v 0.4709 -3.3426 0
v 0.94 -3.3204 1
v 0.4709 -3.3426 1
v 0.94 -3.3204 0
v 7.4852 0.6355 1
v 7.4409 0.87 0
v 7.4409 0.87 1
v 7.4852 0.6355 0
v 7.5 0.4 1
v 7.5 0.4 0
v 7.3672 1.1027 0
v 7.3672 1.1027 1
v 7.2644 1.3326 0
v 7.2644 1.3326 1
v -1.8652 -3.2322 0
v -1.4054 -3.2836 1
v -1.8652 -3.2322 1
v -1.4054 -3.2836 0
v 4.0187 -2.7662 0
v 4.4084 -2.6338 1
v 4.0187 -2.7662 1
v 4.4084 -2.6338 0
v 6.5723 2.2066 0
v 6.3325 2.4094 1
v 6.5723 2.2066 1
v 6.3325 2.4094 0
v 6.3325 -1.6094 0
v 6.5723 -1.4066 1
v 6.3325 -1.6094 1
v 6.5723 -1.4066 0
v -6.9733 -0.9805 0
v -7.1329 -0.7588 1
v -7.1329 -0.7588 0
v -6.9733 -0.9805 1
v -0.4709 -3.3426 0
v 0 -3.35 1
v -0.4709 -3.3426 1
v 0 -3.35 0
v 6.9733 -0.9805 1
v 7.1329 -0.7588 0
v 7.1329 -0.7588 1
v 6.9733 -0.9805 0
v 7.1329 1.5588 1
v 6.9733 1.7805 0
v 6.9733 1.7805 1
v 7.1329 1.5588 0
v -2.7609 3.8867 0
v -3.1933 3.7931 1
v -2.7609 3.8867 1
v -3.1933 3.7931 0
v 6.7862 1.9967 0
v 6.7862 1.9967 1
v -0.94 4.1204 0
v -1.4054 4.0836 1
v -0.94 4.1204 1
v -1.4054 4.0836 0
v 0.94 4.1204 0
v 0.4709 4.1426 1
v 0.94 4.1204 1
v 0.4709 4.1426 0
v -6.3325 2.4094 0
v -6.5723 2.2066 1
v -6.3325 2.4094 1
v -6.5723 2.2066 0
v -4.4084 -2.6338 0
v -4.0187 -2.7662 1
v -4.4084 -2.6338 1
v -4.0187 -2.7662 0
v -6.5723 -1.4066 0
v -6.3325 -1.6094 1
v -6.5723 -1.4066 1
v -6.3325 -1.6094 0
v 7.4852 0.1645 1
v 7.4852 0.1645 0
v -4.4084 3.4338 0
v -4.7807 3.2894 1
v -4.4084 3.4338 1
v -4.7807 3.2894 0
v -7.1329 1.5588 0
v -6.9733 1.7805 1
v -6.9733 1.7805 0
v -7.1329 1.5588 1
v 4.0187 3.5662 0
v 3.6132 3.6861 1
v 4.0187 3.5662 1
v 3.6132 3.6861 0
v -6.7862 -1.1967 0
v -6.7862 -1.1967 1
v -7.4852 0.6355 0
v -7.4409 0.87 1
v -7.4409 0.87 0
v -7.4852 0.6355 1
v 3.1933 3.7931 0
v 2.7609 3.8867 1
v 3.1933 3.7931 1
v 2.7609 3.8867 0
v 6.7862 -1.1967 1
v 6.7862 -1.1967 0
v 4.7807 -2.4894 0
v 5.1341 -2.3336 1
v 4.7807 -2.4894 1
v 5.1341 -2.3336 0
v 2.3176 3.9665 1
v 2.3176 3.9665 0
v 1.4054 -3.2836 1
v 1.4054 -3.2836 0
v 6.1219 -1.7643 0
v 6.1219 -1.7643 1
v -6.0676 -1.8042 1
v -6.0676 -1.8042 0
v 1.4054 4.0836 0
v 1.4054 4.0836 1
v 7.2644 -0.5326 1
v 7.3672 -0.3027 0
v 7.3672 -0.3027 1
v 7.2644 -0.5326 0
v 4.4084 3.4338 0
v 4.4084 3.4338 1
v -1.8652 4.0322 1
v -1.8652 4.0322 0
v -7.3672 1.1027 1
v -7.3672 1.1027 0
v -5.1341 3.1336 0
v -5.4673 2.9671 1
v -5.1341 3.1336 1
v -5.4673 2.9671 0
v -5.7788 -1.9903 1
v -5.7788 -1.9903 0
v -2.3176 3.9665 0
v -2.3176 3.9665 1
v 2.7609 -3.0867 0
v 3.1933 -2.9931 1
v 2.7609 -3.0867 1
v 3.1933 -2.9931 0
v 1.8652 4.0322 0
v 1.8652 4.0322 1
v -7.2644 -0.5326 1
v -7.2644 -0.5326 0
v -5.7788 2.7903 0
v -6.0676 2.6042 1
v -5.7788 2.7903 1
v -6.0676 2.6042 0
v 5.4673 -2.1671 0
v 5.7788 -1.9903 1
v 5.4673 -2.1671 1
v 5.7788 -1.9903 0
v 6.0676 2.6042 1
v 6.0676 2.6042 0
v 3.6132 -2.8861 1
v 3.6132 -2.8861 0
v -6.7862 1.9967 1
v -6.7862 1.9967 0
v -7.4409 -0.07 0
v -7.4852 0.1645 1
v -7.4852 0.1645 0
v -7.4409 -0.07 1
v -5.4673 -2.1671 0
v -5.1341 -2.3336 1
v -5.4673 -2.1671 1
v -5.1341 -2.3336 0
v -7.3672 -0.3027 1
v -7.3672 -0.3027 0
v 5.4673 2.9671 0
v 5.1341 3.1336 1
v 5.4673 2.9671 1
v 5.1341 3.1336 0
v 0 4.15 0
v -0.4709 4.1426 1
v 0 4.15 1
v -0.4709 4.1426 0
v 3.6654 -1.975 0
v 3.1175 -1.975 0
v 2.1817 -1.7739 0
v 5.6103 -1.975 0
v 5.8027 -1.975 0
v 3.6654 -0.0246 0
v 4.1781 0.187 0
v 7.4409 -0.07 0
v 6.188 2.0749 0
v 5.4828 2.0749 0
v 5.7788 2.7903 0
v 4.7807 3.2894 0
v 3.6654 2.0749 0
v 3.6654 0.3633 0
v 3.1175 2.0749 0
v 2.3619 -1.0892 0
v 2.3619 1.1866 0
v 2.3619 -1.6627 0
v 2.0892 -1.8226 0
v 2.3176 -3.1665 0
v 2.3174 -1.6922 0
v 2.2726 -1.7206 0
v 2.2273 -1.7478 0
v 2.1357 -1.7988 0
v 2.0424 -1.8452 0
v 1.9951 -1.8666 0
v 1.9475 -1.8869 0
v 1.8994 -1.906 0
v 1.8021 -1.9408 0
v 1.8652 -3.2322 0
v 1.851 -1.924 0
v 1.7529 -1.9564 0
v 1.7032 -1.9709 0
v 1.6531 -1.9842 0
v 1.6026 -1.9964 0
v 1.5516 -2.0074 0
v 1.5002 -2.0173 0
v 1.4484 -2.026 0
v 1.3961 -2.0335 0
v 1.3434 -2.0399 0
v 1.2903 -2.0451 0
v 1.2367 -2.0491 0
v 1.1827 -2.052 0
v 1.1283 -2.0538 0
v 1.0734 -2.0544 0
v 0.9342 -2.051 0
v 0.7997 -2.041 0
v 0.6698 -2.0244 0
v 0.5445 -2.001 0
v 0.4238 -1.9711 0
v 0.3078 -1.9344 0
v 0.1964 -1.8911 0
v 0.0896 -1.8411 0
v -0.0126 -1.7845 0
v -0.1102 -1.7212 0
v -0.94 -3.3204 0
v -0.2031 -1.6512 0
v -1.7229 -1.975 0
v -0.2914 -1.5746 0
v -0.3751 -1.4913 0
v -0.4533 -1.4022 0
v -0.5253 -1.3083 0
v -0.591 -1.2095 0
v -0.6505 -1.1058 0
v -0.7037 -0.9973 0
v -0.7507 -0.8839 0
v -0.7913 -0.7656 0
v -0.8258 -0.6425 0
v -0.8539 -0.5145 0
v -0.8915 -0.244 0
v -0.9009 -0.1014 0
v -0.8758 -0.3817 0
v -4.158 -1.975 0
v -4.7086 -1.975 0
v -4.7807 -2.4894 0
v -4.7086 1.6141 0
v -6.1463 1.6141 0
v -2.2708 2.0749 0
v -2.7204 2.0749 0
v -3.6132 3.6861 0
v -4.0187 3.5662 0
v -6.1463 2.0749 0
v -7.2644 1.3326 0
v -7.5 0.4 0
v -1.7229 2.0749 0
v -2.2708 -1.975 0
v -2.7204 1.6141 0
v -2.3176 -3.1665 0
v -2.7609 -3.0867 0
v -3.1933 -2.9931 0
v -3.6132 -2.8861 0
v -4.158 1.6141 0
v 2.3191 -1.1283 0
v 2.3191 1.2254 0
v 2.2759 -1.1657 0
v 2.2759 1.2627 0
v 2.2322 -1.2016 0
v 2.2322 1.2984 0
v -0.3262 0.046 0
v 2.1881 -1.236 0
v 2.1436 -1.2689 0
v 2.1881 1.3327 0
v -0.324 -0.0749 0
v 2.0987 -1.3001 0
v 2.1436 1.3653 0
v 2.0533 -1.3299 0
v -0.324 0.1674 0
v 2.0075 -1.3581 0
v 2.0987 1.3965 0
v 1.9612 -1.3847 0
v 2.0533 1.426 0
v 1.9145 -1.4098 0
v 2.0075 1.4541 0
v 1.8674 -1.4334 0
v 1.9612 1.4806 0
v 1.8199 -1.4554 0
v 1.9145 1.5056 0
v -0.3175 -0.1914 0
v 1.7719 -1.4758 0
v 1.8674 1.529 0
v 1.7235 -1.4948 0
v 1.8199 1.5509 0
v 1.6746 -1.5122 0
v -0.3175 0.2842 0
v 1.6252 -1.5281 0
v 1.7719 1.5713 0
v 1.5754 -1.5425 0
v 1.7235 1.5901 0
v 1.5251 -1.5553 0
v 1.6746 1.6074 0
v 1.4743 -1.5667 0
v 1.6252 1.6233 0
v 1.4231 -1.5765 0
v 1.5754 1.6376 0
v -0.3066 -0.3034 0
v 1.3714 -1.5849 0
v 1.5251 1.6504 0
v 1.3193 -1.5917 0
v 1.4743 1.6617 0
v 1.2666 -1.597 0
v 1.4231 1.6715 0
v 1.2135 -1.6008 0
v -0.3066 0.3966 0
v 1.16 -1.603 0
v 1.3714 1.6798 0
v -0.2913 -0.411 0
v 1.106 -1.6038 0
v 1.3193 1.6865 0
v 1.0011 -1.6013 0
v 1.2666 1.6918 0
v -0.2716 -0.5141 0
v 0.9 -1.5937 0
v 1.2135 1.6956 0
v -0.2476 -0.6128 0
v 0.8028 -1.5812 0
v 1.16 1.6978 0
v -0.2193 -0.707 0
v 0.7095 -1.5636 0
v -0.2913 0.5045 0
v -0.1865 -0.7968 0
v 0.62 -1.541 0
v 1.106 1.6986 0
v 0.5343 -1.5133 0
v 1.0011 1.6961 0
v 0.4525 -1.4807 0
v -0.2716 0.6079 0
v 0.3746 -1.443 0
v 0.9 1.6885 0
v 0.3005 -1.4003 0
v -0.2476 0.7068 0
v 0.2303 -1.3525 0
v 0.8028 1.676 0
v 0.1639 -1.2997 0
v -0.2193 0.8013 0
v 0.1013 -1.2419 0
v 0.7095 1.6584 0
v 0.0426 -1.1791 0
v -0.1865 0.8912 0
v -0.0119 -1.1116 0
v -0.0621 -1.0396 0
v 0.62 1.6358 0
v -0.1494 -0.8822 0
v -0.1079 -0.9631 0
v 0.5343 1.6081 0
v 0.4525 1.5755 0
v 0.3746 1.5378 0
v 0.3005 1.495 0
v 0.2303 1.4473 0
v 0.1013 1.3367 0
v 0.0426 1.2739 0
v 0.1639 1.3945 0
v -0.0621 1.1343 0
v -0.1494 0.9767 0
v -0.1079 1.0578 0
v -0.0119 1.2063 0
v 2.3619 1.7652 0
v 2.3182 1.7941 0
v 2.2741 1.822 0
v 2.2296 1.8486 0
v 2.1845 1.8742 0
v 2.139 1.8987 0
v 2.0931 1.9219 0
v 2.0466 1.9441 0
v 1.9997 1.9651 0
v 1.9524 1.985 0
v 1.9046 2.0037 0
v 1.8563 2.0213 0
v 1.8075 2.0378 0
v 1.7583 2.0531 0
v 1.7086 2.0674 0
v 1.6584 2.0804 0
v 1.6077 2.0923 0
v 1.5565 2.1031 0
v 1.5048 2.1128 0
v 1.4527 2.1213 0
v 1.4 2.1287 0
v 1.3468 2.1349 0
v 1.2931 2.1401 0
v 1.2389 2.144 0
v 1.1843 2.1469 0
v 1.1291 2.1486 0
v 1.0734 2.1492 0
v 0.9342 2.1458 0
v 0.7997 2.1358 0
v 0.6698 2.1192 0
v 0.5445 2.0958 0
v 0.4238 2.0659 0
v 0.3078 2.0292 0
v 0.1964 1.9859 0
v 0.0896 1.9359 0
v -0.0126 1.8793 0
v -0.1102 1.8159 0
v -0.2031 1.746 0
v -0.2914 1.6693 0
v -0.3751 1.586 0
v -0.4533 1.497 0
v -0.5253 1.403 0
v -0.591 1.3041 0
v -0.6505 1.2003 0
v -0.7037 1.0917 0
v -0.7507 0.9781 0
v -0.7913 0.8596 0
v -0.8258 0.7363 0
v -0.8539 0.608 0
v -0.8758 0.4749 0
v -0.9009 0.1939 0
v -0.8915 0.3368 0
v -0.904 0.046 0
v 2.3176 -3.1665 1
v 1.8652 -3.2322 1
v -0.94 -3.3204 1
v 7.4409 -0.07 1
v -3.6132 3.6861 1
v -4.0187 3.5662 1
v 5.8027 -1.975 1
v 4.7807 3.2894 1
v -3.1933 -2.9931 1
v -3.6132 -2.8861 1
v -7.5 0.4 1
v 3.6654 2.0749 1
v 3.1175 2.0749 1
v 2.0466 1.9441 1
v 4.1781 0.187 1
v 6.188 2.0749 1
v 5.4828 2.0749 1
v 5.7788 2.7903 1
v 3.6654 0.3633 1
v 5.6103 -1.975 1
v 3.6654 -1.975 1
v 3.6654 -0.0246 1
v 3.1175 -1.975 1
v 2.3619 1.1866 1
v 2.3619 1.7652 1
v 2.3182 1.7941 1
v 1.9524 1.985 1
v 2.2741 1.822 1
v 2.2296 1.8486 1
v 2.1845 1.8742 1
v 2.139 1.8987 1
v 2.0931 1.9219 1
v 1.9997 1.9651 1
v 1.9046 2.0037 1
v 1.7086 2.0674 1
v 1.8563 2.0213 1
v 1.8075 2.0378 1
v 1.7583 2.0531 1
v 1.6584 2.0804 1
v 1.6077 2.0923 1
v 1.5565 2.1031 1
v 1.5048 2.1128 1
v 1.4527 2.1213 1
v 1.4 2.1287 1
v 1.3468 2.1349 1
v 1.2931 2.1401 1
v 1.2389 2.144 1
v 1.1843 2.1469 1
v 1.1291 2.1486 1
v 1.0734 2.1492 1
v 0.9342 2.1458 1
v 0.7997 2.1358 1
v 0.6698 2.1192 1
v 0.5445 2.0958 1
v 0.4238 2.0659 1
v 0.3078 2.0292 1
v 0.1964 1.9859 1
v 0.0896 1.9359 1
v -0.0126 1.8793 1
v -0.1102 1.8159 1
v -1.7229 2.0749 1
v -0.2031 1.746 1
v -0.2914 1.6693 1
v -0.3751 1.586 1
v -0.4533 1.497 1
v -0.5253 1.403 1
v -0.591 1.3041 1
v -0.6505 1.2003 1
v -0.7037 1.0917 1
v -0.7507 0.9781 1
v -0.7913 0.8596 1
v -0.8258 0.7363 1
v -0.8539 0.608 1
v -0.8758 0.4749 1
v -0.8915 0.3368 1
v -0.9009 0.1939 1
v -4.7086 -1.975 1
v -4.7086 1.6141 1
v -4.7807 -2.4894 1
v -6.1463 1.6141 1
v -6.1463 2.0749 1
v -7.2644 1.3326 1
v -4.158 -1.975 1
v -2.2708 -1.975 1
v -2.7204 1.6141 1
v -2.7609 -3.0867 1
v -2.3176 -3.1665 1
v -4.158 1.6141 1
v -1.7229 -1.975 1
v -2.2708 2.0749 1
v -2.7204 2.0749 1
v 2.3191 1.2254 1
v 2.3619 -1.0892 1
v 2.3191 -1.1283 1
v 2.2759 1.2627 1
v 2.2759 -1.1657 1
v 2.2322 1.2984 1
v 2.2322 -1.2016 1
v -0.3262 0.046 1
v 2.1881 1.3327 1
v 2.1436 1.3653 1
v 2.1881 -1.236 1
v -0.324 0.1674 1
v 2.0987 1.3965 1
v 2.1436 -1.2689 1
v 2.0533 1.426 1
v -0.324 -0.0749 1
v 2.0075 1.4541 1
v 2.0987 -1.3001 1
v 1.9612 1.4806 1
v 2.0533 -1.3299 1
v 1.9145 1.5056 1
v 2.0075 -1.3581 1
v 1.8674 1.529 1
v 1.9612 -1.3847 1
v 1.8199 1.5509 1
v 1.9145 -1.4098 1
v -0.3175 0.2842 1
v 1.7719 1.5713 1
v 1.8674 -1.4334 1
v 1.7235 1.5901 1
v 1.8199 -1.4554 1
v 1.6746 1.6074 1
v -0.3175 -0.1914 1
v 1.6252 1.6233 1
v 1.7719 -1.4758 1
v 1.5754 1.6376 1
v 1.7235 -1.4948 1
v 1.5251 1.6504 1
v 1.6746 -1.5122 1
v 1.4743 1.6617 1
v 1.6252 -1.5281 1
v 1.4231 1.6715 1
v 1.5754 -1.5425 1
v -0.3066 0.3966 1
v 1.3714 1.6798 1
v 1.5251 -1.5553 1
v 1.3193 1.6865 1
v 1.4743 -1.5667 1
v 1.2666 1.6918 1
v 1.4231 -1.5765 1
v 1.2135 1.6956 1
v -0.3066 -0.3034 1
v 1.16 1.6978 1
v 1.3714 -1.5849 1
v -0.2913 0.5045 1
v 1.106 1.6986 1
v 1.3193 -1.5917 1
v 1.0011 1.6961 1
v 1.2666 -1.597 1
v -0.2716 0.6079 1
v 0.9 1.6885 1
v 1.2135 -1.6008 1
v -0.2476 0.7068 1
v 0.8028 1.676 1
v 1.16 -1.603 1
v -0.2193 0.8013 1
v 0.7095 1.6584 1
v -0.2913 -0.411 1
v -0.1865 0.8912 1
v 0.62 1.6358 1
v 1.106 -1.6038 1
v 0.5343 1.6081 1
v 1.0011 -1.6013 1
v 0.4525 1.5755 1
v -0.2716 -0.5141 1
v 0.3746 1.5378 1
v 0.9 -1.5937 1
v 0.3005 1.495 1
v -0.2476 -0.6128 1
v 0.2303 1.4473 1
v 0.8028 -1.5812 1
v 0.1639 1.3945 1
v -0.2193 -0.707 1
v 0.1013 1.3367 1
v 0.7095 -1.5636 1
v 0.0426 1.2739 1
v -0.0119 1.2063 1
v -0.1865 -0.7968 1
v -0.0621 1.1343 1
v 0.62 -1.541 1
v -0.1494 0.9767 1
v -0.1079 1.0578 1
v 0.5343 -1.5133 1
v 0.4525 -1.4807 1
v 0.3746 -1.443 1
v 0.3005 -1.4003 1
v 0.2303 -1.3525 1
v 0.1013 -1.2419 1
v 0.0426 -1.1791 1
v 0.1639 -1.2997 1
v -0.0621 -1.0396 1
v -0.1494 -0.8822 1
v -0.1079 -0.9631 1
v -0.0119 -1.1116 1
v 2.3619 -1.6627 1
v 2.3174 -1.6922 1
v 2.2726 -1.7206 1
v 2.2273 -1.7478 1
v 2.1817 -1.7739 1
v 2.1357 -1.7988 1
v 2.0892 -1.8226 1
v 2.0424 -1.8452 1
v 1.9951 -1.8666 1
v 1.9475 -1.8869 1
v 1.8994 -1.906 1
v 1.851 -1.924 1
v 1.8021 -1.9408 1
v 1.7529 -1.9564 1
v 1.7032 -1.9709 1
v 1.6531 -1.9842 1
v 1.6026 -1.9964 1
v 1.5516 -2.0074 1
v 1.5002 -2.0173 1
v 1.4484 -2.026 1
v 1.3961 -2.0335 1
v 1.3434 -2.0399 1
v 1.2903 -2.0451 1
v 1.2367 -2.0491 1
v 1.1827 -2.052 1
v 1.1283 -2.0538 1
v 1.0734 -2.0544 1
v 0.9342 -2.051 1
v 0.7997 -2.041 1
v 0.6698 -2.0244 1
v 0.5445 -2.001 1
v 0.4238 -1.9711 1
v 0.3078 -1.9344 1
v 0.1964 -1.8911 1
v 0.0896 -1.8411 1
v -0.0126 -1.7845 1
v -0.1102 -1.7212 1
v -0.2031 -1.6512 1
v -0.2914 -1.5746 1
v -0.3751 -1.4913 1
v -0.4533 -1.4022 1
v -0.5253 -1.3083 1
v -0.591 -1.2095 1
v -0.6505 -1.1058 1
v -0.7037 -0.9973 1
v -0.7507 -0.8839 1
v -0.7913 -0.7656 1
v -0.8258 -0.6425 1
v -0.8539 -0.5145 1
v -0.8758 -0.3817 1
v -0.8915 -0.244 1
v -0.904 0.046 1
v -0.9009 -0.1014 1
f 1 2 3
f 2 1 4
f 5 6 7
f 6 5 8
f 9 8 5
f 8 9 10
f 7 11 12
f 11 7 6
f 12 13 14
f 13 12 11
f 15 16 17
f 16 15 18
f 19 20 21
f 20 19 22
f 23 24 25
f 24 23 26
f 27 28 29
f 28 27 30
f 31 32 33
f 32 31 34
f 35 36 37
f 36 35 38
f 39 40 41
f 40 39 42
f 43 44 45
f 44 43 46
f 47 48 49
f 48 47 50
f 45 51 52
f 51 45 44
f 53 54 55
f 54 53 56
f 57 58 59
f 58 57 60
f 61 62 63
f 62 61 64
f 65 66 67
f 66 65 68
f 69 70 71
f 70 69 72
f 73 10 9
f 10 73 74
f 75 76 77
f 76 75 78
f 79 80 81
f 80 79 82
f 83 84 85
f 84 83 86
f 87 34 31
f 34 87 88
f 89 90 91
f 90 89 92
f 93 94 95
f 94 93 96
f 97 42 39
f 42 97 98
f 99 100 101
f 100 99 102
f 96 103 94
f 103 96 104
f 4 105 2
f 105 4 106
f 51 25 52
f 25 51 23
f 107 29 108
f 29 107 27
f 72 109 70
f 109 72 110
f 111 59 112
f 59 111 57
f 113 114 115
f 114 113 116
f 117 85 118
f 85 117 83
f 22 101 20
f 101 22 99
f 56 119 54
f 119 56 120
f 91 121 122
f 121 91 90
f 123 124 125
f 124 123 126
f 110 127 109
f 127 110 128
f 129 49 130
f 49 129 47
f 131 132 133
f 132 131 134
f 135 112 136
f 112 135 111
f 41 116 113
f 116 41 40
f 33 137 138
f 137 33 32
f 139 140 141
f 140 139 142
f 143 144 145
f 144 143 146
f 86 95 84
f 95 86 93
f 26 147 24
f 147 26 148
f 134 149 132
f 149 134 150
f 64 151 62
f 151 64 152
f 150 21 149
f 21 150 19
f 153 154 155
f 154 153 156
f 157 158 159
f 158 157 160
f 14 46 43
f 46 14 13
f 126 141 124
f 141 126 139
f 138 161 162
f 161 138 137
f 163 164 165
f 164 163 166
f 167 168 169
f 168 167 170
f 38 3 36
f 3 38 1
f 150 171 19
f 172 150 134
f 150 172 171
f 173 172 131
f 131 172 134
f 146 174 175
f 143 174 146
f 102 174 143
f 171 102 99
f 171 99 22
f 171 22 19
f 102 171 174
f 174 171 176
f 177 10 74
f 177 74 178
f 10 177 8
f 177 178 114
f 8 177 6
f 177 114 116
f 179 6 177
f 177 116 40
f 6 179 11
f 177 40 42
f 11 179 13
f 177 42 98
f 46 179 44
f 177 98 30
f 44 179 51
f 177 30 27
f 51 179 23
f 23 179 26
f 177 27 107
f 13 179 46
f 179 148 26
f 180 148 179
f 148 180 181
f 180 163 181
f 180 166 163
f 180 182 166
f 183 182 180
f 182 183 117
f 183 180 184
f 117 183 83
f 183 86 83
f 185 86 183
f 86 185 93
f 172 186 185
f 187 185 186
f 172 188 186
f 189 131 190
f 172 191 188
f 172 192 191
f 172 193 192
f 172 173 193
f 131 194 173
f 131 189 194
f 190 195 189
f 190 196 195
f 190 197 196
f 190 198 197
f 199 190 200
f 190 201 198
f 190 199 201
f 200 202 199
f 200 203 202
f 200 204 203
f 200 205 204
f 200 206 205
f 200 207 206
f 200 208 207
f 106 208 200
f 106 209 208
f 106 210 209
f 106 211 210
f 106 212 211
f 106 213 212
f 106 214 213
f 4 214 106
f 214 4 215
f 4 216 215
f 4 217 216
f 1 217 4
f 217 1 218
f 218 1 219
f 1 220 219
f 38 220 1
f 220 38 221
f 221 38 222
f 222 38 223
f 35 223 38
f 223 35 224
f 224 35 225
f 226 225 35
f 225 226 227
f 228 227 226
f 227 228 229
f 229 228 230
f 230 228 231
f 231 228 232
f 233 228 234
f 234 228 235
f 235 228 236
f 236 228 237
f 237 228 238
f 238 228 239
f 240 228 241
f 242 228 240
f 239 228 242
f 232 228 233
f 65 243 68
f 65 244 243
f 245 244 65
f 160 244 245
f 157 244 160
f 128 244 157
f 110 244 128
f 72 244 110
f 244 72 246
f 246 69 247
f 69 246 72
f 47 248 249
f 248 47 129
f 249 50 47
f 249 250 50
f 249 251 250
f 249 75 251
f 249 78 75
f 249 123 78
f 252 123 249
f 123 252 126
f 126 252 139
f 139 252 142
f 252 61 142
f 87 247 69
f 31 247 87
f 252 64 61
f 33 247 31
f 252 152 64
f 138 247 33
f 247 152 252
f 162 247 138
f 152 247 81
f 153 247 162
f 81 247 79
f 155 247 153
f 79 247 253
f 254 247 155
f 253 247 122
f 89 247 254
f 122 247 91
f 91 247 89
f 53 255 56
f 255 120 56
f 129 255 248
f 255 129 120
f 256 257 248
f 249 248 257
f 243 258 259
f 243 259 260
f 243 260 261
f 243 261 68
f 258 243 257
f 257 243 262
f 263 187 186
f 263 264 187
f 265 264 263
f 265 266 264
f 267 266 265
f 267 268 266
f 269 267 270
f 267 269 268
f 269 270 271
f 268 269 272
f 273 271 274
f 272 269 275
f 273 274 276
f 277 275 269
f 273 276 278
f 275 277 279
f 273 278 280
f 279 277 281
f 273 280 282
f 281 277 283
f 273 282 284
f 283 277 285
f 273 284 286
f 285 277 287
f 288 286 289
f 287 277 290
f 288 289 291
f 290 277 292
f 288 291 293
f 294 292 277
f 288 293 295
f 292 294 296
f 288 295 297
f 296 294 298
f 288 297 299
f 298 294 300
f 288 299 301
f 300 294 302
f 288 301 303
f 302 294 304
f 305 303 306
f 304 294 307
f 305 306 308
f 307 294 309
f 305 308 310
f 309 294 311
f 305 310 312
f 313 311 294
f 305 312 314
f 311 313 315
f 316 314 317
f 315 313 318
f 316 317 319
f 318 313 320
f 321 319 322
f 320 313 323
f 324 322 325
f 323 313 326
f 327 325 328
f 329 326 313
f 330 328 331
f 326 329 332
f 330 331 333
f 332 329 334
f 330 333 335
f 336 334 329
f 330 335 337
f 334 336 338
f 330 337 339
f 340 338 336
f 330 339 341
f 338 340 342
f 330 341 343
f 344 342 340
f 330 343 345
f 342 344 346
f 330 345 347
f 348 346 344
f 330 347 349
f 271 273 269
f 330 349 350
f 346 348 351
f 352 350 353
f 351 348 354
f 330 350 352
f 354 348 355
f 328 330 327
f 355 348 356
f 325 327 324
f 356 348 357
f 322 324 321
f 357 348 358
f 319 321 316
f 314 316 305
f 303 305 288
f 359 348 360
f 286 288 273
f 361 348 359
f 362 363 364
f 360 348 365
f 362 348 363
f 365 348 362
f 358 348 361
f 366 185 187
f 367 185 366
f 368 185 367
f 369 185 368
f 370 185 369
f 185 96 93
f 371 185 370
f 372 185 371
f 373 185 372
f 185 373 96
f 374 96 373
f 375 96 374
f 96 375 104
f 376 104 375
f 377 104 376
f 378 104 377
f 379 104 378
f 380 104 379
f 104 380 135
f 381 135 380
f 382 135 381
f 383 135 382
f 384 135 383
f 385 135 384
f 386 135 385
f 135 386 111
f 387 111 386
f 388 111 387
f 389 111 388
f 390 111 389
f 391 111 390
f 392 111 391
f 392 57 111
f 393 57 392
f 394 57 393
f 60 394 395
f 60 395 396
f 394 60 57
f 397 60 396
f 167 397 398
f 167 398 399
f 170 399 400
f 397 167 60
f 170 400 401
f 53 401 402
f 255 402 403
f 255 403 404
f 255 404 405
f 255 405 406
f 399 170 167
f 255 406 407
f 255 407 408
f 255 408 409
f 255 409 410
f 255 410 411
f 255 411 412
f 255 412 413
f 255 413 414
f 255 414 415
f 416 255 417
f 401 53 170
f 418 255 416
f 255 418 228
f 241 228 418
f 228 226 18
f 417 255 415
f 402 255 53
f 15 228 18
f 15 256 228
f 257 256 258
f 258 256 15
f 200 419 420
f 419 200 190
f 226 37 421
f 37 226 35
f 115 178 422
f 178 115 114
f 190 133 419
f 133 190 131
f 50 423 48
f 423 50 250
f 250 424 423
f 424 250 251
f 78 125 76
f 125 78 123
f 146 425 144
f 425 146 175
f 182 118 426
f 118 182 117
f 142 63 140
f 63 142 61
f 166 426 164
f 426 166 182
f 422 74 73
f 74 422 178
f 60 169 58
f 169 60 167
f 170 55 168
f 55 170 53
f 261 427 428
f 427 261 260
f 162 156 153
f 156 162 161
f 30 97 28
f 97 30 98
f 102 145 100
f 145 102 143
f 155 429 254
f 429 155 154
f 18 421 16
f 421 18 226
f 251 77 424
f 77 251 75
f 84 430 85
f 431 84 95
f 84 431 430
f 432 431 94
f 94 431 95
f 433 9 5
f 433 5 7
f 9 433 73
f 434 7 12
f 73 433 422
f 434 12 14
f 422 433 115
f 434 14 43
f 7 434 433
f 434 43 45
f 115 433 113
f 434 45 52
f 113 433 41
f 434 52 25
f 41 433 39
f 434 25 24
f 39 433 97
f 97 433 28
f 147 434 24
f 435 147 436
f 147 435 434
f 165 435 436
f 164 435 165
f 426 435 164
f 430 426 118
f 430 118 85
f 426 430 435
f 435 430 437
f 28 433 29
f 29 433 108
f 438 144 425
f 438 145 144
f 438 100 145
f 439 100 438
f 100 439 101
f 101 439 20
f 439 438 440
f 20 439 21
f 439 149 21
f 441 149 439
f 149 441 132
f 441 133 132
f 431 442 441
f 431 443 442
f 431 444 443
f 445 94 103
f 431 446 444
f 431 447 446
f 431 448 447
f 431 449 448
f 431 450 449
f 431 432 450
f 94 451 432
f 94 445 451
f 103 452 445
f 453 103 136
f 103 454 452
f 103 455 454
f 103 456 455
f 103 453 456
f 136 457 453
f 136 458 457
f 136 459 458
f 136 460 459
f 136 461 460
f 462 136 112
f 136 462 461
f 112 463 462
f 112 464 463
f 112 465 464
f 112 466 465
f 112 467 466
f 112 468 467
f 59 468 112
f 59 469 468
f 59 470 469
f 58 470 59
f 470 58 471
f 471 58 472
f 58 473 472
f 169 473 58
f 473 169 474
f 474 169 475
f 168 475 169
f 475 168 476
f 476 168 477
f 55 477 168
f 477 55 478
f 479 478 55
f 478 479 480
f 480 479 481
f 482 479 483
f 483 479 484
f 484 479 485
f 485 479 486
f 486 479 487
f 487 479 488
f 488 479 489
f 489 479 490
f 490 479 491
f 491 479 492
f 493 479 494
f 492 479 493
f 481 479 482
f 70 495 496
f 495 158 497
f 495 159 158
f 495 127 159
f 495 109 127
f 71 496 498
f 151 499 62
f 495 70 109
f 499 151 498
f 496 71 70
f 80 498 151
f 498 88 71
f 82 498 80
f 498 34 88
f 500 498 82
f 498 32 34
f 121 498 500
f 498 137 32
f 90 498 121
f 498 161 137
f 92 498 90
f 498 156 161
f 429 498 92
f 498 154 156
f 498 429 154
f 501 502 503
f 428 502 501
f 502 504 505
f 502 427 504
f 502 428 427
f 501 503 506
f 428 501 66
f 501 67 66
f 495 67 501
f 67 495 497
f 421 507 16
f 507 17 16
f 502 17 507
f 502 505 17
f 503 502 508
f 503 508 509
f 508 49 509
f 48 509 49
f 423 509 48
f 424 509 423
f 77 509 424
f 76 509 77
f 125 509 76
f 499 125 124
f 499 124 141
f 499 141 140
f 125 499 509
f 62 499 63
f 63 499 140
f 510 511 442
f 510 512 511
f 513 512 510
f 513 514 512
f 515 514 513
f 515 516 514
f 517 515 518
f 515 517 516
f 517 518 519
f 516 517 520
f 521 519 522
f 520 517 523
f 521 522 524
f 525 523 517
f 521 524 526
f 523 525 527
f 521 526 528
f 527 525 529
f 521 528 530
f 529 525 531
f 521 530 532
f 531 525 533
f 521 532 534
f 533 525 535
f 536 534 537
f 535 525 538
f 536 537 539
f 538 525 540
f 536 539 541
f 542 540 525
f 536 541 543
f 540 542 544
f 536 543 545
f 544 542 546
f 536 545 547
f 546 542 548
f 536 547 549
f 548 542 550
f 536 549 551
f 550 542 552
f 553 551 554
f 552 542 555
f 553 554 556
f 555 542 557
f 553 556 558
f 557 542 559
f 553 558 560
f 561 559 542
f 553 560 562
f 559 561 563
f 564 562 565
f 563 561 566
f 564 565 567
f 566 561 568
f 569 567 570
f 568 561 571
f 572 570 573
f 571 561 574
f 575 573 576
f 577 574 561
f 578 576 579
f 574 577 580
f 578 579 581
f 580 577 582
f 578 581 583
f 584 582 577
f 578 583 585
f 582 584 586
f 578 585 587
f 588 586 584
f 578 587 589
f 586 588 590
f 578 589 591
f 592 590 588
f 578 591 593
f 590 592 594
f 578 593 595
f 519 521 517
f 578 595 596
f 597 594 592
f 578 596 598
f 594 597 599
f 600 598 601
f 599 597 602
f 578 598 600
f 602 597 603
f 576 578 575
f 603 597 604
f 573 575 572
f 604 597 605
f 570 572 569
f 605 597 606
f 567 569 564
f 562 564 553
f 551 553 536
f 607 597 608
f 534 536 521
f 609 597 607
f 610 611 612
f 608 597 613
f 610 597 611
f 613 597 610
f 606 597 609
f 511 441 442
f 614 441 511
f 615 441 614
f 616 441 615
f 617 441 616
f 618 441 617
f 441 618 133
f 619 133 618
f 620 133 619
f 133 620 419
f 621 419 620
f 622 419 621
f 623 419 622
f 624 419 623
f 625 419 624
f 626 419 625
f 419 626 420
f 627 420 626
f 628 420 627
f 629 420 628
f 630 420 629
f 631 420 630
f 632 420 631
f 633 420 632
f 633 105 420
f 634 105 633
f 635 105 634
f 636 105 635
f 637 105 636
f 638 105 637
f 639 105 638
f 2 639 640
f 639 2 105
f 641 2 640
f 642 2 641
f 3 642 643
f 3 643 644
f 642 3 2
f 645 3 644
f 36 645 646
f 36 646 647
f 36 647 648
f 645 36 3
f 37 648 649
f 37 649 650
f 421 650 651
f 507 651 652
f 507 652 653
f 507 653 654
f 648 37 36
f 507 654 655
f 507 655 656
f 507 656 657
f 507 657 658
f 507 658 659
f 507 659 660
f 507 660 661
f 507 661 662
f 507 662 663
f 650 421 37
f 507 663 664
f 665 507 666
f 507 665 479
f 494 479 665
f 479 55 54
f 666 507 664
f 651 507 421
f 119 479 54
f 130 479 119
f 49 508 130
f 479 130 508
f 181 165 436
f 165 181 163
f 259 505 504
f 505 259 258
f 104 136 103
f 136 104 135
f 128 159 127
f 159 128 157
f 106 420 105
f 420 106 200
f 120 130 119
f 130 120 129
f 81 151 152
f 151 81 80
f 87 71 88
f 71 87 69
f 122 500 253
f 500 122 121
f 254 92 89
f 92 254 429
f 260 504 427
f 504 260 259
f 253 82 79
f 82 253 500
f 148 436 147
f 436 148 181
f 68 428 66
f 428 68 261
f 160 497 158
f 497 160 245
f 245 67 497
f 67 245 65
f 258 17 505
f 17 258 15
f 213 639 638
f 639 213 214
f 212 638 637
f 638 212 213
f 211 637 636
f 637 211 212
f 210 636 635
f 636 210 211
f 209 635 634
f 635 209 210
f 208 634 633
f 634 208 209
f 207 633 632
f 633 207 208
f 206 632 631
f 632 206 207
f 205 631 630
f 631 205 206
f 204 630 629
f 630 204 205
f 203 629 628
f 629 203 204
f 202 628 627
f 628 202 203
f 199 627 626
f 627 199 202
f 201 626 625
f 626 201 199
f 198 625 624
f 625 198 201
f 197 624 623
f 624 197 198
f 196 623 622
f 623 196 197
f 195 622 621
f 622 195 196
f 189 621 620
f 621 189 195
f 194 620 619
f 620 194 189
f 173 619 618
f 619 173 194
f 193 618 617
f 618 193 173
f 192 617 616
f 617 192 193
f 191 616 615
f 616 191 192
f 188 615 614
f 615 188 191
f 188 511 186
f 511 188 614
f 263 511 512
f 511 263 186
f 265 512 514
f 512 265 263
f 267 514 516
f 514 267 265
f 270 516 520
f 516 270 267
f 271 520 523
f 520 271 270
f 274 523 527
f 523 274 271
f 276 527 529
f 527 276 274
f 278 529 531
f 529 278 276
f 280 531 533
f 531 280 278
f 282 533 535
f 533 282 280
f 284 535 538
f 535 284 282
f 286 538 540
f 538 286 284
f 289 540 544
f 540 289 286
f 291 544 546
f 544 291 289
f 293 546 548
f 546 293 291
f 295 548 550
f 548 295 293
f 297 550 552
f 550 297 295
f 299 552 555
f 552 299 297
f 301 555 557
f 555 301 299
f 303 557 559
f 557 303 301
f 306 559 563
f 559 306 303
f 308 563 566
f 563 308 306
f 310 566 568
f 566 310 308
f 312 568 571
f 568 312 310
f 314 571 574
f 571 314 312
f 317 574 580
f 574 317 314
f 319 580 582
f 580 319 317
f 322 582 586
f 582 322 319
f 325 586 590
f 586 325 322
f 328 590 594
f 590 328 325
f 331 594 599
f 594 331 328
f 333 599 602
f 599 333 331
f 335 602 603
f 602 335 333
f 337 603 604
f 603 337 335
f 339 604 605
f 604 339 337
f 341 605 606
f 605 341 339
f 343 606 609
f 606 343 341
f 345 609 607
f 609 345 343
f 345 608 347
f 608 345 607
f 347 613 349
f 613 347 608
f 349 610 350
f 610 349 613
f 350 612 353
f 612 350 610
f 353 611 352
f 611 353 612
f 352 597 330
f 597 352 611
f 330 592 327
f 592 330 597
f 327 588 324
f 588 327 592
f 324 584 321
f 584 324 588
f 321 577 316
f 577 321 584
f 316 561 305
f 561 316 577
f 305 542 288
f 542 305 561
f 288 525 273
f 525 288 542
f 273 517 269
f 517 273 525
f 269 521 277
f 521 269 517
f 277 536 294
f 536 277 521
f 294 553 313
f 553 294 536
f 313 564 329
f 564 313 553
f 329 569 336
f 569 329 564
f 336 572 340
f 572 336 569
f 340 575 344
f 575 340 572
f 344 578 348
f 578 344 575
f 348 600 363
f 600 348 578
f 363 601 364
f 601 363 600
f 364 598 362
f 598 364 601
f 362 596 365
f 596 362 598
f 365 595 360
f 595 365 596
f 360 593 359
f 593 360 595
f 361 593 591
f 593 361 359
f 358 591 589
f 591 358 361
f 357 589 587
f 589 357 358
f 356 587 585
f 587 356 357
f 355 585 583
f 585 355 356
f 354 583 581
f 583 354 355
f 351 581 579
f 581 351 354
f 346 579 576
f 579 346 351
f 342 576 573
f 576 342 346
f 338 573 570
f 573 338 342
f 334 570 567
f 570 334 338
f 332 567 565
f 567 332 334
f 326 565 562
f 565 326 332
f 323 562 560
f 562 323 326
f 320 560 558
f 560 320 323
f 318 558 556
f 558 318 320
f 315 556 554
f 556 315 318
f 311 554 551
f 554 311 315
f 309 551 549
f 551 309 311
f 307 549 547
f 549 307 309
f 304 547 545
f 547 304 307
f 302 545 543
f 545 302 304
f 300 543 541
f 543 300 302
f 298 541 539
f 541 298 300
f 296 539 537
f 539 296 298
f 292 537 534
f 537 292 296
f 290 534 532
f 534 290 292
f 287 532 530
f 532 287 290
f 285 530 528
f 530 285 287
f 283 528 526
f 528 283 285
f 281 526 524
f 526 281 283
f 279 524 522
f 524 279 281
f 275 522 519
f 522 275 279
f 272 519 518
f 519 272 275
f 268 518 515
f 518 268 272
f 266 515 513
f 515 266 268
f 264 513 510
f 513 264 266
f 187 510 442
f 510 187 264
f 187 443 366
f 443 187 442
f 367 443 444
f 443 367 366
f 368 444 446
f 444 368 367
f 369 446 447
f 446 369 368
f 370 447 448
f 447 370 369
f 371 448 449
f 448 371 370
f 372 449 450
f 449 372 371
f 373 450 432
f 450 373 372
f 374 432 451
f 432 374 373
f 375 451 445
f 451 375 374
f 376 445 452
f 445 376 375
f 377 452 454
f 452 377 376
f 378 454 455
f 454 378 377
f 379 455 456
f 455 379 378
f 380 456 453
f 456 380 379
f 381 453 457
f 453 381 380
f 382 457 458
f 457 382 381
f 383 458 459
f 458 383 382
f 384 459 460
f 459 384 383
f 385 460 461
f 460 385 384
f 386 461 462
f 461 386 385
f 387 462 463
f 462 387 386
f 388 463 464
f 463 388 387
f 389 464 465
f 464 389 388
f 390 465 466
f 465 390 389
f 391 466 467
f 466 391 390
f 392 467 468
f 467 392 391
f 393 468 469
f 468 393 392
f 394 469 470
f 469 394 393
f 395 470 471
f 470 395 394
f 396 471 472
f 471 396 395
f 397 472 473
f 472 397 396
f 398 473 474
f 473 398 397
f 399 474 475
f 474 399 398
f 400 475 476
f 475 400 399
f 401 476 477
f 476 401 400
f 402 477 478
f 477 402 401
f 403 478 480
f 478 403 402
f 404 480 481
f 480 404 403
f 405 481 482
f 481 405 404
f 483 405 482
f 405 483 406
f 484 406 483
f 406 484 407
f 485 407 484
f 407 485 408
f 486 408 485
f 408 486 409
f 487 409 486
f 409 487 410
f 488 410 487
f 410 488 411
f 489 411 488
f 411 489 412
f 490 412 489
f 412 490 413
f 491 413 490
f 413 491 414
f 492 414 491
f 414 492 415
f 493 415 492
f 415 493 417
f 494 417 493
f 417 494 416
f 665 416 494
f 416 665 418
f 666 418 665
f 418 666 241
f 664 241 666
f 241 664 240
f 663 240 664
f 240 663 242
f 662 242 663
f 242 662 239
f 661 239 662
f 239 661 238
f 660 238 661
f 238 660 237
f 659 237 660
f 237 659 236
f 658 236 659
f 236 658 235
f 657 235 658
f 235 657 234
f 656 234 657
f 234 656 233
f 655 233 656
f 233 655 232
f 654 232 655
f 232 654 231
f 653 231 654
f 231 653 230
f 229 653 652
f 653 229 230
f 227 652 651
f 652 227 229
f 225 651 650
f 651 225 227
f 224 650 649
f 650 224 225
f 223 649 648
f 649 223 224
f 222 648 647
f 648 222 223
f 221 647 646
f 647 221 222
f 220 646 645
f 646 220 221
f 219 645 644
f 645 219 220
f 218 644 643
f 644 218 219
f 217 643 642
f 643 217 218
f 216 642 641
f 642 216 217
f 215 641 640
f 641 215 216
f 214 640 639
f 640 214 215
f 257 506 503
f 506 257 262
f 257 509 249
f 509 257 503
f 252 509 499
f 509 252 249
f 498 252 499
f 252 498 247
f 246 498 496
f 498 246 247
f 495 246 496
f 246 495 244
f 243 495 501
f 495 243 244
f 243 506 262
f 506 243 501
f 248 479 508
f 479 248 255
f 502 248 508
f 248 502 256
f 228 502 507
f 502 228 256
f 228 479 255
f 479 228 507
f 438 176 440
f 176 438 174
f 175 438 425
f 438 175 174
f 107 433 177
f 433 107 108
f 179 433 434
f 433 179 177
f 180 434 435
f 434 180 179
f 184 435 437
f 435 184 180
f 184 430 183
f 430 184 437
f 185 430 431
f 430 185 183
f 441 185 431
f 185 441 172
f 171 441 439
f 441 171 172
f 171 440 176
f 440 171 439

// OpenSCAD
$fn=100;
difference(){
    translate([0,0.4,0])
        scale([1,0.5,1])
            cylinder(1,r=15/2);
    
    linear_extrude(height = 2)
        text("TICK",4, halign="center", valign="center", font="Helvetika");
}
